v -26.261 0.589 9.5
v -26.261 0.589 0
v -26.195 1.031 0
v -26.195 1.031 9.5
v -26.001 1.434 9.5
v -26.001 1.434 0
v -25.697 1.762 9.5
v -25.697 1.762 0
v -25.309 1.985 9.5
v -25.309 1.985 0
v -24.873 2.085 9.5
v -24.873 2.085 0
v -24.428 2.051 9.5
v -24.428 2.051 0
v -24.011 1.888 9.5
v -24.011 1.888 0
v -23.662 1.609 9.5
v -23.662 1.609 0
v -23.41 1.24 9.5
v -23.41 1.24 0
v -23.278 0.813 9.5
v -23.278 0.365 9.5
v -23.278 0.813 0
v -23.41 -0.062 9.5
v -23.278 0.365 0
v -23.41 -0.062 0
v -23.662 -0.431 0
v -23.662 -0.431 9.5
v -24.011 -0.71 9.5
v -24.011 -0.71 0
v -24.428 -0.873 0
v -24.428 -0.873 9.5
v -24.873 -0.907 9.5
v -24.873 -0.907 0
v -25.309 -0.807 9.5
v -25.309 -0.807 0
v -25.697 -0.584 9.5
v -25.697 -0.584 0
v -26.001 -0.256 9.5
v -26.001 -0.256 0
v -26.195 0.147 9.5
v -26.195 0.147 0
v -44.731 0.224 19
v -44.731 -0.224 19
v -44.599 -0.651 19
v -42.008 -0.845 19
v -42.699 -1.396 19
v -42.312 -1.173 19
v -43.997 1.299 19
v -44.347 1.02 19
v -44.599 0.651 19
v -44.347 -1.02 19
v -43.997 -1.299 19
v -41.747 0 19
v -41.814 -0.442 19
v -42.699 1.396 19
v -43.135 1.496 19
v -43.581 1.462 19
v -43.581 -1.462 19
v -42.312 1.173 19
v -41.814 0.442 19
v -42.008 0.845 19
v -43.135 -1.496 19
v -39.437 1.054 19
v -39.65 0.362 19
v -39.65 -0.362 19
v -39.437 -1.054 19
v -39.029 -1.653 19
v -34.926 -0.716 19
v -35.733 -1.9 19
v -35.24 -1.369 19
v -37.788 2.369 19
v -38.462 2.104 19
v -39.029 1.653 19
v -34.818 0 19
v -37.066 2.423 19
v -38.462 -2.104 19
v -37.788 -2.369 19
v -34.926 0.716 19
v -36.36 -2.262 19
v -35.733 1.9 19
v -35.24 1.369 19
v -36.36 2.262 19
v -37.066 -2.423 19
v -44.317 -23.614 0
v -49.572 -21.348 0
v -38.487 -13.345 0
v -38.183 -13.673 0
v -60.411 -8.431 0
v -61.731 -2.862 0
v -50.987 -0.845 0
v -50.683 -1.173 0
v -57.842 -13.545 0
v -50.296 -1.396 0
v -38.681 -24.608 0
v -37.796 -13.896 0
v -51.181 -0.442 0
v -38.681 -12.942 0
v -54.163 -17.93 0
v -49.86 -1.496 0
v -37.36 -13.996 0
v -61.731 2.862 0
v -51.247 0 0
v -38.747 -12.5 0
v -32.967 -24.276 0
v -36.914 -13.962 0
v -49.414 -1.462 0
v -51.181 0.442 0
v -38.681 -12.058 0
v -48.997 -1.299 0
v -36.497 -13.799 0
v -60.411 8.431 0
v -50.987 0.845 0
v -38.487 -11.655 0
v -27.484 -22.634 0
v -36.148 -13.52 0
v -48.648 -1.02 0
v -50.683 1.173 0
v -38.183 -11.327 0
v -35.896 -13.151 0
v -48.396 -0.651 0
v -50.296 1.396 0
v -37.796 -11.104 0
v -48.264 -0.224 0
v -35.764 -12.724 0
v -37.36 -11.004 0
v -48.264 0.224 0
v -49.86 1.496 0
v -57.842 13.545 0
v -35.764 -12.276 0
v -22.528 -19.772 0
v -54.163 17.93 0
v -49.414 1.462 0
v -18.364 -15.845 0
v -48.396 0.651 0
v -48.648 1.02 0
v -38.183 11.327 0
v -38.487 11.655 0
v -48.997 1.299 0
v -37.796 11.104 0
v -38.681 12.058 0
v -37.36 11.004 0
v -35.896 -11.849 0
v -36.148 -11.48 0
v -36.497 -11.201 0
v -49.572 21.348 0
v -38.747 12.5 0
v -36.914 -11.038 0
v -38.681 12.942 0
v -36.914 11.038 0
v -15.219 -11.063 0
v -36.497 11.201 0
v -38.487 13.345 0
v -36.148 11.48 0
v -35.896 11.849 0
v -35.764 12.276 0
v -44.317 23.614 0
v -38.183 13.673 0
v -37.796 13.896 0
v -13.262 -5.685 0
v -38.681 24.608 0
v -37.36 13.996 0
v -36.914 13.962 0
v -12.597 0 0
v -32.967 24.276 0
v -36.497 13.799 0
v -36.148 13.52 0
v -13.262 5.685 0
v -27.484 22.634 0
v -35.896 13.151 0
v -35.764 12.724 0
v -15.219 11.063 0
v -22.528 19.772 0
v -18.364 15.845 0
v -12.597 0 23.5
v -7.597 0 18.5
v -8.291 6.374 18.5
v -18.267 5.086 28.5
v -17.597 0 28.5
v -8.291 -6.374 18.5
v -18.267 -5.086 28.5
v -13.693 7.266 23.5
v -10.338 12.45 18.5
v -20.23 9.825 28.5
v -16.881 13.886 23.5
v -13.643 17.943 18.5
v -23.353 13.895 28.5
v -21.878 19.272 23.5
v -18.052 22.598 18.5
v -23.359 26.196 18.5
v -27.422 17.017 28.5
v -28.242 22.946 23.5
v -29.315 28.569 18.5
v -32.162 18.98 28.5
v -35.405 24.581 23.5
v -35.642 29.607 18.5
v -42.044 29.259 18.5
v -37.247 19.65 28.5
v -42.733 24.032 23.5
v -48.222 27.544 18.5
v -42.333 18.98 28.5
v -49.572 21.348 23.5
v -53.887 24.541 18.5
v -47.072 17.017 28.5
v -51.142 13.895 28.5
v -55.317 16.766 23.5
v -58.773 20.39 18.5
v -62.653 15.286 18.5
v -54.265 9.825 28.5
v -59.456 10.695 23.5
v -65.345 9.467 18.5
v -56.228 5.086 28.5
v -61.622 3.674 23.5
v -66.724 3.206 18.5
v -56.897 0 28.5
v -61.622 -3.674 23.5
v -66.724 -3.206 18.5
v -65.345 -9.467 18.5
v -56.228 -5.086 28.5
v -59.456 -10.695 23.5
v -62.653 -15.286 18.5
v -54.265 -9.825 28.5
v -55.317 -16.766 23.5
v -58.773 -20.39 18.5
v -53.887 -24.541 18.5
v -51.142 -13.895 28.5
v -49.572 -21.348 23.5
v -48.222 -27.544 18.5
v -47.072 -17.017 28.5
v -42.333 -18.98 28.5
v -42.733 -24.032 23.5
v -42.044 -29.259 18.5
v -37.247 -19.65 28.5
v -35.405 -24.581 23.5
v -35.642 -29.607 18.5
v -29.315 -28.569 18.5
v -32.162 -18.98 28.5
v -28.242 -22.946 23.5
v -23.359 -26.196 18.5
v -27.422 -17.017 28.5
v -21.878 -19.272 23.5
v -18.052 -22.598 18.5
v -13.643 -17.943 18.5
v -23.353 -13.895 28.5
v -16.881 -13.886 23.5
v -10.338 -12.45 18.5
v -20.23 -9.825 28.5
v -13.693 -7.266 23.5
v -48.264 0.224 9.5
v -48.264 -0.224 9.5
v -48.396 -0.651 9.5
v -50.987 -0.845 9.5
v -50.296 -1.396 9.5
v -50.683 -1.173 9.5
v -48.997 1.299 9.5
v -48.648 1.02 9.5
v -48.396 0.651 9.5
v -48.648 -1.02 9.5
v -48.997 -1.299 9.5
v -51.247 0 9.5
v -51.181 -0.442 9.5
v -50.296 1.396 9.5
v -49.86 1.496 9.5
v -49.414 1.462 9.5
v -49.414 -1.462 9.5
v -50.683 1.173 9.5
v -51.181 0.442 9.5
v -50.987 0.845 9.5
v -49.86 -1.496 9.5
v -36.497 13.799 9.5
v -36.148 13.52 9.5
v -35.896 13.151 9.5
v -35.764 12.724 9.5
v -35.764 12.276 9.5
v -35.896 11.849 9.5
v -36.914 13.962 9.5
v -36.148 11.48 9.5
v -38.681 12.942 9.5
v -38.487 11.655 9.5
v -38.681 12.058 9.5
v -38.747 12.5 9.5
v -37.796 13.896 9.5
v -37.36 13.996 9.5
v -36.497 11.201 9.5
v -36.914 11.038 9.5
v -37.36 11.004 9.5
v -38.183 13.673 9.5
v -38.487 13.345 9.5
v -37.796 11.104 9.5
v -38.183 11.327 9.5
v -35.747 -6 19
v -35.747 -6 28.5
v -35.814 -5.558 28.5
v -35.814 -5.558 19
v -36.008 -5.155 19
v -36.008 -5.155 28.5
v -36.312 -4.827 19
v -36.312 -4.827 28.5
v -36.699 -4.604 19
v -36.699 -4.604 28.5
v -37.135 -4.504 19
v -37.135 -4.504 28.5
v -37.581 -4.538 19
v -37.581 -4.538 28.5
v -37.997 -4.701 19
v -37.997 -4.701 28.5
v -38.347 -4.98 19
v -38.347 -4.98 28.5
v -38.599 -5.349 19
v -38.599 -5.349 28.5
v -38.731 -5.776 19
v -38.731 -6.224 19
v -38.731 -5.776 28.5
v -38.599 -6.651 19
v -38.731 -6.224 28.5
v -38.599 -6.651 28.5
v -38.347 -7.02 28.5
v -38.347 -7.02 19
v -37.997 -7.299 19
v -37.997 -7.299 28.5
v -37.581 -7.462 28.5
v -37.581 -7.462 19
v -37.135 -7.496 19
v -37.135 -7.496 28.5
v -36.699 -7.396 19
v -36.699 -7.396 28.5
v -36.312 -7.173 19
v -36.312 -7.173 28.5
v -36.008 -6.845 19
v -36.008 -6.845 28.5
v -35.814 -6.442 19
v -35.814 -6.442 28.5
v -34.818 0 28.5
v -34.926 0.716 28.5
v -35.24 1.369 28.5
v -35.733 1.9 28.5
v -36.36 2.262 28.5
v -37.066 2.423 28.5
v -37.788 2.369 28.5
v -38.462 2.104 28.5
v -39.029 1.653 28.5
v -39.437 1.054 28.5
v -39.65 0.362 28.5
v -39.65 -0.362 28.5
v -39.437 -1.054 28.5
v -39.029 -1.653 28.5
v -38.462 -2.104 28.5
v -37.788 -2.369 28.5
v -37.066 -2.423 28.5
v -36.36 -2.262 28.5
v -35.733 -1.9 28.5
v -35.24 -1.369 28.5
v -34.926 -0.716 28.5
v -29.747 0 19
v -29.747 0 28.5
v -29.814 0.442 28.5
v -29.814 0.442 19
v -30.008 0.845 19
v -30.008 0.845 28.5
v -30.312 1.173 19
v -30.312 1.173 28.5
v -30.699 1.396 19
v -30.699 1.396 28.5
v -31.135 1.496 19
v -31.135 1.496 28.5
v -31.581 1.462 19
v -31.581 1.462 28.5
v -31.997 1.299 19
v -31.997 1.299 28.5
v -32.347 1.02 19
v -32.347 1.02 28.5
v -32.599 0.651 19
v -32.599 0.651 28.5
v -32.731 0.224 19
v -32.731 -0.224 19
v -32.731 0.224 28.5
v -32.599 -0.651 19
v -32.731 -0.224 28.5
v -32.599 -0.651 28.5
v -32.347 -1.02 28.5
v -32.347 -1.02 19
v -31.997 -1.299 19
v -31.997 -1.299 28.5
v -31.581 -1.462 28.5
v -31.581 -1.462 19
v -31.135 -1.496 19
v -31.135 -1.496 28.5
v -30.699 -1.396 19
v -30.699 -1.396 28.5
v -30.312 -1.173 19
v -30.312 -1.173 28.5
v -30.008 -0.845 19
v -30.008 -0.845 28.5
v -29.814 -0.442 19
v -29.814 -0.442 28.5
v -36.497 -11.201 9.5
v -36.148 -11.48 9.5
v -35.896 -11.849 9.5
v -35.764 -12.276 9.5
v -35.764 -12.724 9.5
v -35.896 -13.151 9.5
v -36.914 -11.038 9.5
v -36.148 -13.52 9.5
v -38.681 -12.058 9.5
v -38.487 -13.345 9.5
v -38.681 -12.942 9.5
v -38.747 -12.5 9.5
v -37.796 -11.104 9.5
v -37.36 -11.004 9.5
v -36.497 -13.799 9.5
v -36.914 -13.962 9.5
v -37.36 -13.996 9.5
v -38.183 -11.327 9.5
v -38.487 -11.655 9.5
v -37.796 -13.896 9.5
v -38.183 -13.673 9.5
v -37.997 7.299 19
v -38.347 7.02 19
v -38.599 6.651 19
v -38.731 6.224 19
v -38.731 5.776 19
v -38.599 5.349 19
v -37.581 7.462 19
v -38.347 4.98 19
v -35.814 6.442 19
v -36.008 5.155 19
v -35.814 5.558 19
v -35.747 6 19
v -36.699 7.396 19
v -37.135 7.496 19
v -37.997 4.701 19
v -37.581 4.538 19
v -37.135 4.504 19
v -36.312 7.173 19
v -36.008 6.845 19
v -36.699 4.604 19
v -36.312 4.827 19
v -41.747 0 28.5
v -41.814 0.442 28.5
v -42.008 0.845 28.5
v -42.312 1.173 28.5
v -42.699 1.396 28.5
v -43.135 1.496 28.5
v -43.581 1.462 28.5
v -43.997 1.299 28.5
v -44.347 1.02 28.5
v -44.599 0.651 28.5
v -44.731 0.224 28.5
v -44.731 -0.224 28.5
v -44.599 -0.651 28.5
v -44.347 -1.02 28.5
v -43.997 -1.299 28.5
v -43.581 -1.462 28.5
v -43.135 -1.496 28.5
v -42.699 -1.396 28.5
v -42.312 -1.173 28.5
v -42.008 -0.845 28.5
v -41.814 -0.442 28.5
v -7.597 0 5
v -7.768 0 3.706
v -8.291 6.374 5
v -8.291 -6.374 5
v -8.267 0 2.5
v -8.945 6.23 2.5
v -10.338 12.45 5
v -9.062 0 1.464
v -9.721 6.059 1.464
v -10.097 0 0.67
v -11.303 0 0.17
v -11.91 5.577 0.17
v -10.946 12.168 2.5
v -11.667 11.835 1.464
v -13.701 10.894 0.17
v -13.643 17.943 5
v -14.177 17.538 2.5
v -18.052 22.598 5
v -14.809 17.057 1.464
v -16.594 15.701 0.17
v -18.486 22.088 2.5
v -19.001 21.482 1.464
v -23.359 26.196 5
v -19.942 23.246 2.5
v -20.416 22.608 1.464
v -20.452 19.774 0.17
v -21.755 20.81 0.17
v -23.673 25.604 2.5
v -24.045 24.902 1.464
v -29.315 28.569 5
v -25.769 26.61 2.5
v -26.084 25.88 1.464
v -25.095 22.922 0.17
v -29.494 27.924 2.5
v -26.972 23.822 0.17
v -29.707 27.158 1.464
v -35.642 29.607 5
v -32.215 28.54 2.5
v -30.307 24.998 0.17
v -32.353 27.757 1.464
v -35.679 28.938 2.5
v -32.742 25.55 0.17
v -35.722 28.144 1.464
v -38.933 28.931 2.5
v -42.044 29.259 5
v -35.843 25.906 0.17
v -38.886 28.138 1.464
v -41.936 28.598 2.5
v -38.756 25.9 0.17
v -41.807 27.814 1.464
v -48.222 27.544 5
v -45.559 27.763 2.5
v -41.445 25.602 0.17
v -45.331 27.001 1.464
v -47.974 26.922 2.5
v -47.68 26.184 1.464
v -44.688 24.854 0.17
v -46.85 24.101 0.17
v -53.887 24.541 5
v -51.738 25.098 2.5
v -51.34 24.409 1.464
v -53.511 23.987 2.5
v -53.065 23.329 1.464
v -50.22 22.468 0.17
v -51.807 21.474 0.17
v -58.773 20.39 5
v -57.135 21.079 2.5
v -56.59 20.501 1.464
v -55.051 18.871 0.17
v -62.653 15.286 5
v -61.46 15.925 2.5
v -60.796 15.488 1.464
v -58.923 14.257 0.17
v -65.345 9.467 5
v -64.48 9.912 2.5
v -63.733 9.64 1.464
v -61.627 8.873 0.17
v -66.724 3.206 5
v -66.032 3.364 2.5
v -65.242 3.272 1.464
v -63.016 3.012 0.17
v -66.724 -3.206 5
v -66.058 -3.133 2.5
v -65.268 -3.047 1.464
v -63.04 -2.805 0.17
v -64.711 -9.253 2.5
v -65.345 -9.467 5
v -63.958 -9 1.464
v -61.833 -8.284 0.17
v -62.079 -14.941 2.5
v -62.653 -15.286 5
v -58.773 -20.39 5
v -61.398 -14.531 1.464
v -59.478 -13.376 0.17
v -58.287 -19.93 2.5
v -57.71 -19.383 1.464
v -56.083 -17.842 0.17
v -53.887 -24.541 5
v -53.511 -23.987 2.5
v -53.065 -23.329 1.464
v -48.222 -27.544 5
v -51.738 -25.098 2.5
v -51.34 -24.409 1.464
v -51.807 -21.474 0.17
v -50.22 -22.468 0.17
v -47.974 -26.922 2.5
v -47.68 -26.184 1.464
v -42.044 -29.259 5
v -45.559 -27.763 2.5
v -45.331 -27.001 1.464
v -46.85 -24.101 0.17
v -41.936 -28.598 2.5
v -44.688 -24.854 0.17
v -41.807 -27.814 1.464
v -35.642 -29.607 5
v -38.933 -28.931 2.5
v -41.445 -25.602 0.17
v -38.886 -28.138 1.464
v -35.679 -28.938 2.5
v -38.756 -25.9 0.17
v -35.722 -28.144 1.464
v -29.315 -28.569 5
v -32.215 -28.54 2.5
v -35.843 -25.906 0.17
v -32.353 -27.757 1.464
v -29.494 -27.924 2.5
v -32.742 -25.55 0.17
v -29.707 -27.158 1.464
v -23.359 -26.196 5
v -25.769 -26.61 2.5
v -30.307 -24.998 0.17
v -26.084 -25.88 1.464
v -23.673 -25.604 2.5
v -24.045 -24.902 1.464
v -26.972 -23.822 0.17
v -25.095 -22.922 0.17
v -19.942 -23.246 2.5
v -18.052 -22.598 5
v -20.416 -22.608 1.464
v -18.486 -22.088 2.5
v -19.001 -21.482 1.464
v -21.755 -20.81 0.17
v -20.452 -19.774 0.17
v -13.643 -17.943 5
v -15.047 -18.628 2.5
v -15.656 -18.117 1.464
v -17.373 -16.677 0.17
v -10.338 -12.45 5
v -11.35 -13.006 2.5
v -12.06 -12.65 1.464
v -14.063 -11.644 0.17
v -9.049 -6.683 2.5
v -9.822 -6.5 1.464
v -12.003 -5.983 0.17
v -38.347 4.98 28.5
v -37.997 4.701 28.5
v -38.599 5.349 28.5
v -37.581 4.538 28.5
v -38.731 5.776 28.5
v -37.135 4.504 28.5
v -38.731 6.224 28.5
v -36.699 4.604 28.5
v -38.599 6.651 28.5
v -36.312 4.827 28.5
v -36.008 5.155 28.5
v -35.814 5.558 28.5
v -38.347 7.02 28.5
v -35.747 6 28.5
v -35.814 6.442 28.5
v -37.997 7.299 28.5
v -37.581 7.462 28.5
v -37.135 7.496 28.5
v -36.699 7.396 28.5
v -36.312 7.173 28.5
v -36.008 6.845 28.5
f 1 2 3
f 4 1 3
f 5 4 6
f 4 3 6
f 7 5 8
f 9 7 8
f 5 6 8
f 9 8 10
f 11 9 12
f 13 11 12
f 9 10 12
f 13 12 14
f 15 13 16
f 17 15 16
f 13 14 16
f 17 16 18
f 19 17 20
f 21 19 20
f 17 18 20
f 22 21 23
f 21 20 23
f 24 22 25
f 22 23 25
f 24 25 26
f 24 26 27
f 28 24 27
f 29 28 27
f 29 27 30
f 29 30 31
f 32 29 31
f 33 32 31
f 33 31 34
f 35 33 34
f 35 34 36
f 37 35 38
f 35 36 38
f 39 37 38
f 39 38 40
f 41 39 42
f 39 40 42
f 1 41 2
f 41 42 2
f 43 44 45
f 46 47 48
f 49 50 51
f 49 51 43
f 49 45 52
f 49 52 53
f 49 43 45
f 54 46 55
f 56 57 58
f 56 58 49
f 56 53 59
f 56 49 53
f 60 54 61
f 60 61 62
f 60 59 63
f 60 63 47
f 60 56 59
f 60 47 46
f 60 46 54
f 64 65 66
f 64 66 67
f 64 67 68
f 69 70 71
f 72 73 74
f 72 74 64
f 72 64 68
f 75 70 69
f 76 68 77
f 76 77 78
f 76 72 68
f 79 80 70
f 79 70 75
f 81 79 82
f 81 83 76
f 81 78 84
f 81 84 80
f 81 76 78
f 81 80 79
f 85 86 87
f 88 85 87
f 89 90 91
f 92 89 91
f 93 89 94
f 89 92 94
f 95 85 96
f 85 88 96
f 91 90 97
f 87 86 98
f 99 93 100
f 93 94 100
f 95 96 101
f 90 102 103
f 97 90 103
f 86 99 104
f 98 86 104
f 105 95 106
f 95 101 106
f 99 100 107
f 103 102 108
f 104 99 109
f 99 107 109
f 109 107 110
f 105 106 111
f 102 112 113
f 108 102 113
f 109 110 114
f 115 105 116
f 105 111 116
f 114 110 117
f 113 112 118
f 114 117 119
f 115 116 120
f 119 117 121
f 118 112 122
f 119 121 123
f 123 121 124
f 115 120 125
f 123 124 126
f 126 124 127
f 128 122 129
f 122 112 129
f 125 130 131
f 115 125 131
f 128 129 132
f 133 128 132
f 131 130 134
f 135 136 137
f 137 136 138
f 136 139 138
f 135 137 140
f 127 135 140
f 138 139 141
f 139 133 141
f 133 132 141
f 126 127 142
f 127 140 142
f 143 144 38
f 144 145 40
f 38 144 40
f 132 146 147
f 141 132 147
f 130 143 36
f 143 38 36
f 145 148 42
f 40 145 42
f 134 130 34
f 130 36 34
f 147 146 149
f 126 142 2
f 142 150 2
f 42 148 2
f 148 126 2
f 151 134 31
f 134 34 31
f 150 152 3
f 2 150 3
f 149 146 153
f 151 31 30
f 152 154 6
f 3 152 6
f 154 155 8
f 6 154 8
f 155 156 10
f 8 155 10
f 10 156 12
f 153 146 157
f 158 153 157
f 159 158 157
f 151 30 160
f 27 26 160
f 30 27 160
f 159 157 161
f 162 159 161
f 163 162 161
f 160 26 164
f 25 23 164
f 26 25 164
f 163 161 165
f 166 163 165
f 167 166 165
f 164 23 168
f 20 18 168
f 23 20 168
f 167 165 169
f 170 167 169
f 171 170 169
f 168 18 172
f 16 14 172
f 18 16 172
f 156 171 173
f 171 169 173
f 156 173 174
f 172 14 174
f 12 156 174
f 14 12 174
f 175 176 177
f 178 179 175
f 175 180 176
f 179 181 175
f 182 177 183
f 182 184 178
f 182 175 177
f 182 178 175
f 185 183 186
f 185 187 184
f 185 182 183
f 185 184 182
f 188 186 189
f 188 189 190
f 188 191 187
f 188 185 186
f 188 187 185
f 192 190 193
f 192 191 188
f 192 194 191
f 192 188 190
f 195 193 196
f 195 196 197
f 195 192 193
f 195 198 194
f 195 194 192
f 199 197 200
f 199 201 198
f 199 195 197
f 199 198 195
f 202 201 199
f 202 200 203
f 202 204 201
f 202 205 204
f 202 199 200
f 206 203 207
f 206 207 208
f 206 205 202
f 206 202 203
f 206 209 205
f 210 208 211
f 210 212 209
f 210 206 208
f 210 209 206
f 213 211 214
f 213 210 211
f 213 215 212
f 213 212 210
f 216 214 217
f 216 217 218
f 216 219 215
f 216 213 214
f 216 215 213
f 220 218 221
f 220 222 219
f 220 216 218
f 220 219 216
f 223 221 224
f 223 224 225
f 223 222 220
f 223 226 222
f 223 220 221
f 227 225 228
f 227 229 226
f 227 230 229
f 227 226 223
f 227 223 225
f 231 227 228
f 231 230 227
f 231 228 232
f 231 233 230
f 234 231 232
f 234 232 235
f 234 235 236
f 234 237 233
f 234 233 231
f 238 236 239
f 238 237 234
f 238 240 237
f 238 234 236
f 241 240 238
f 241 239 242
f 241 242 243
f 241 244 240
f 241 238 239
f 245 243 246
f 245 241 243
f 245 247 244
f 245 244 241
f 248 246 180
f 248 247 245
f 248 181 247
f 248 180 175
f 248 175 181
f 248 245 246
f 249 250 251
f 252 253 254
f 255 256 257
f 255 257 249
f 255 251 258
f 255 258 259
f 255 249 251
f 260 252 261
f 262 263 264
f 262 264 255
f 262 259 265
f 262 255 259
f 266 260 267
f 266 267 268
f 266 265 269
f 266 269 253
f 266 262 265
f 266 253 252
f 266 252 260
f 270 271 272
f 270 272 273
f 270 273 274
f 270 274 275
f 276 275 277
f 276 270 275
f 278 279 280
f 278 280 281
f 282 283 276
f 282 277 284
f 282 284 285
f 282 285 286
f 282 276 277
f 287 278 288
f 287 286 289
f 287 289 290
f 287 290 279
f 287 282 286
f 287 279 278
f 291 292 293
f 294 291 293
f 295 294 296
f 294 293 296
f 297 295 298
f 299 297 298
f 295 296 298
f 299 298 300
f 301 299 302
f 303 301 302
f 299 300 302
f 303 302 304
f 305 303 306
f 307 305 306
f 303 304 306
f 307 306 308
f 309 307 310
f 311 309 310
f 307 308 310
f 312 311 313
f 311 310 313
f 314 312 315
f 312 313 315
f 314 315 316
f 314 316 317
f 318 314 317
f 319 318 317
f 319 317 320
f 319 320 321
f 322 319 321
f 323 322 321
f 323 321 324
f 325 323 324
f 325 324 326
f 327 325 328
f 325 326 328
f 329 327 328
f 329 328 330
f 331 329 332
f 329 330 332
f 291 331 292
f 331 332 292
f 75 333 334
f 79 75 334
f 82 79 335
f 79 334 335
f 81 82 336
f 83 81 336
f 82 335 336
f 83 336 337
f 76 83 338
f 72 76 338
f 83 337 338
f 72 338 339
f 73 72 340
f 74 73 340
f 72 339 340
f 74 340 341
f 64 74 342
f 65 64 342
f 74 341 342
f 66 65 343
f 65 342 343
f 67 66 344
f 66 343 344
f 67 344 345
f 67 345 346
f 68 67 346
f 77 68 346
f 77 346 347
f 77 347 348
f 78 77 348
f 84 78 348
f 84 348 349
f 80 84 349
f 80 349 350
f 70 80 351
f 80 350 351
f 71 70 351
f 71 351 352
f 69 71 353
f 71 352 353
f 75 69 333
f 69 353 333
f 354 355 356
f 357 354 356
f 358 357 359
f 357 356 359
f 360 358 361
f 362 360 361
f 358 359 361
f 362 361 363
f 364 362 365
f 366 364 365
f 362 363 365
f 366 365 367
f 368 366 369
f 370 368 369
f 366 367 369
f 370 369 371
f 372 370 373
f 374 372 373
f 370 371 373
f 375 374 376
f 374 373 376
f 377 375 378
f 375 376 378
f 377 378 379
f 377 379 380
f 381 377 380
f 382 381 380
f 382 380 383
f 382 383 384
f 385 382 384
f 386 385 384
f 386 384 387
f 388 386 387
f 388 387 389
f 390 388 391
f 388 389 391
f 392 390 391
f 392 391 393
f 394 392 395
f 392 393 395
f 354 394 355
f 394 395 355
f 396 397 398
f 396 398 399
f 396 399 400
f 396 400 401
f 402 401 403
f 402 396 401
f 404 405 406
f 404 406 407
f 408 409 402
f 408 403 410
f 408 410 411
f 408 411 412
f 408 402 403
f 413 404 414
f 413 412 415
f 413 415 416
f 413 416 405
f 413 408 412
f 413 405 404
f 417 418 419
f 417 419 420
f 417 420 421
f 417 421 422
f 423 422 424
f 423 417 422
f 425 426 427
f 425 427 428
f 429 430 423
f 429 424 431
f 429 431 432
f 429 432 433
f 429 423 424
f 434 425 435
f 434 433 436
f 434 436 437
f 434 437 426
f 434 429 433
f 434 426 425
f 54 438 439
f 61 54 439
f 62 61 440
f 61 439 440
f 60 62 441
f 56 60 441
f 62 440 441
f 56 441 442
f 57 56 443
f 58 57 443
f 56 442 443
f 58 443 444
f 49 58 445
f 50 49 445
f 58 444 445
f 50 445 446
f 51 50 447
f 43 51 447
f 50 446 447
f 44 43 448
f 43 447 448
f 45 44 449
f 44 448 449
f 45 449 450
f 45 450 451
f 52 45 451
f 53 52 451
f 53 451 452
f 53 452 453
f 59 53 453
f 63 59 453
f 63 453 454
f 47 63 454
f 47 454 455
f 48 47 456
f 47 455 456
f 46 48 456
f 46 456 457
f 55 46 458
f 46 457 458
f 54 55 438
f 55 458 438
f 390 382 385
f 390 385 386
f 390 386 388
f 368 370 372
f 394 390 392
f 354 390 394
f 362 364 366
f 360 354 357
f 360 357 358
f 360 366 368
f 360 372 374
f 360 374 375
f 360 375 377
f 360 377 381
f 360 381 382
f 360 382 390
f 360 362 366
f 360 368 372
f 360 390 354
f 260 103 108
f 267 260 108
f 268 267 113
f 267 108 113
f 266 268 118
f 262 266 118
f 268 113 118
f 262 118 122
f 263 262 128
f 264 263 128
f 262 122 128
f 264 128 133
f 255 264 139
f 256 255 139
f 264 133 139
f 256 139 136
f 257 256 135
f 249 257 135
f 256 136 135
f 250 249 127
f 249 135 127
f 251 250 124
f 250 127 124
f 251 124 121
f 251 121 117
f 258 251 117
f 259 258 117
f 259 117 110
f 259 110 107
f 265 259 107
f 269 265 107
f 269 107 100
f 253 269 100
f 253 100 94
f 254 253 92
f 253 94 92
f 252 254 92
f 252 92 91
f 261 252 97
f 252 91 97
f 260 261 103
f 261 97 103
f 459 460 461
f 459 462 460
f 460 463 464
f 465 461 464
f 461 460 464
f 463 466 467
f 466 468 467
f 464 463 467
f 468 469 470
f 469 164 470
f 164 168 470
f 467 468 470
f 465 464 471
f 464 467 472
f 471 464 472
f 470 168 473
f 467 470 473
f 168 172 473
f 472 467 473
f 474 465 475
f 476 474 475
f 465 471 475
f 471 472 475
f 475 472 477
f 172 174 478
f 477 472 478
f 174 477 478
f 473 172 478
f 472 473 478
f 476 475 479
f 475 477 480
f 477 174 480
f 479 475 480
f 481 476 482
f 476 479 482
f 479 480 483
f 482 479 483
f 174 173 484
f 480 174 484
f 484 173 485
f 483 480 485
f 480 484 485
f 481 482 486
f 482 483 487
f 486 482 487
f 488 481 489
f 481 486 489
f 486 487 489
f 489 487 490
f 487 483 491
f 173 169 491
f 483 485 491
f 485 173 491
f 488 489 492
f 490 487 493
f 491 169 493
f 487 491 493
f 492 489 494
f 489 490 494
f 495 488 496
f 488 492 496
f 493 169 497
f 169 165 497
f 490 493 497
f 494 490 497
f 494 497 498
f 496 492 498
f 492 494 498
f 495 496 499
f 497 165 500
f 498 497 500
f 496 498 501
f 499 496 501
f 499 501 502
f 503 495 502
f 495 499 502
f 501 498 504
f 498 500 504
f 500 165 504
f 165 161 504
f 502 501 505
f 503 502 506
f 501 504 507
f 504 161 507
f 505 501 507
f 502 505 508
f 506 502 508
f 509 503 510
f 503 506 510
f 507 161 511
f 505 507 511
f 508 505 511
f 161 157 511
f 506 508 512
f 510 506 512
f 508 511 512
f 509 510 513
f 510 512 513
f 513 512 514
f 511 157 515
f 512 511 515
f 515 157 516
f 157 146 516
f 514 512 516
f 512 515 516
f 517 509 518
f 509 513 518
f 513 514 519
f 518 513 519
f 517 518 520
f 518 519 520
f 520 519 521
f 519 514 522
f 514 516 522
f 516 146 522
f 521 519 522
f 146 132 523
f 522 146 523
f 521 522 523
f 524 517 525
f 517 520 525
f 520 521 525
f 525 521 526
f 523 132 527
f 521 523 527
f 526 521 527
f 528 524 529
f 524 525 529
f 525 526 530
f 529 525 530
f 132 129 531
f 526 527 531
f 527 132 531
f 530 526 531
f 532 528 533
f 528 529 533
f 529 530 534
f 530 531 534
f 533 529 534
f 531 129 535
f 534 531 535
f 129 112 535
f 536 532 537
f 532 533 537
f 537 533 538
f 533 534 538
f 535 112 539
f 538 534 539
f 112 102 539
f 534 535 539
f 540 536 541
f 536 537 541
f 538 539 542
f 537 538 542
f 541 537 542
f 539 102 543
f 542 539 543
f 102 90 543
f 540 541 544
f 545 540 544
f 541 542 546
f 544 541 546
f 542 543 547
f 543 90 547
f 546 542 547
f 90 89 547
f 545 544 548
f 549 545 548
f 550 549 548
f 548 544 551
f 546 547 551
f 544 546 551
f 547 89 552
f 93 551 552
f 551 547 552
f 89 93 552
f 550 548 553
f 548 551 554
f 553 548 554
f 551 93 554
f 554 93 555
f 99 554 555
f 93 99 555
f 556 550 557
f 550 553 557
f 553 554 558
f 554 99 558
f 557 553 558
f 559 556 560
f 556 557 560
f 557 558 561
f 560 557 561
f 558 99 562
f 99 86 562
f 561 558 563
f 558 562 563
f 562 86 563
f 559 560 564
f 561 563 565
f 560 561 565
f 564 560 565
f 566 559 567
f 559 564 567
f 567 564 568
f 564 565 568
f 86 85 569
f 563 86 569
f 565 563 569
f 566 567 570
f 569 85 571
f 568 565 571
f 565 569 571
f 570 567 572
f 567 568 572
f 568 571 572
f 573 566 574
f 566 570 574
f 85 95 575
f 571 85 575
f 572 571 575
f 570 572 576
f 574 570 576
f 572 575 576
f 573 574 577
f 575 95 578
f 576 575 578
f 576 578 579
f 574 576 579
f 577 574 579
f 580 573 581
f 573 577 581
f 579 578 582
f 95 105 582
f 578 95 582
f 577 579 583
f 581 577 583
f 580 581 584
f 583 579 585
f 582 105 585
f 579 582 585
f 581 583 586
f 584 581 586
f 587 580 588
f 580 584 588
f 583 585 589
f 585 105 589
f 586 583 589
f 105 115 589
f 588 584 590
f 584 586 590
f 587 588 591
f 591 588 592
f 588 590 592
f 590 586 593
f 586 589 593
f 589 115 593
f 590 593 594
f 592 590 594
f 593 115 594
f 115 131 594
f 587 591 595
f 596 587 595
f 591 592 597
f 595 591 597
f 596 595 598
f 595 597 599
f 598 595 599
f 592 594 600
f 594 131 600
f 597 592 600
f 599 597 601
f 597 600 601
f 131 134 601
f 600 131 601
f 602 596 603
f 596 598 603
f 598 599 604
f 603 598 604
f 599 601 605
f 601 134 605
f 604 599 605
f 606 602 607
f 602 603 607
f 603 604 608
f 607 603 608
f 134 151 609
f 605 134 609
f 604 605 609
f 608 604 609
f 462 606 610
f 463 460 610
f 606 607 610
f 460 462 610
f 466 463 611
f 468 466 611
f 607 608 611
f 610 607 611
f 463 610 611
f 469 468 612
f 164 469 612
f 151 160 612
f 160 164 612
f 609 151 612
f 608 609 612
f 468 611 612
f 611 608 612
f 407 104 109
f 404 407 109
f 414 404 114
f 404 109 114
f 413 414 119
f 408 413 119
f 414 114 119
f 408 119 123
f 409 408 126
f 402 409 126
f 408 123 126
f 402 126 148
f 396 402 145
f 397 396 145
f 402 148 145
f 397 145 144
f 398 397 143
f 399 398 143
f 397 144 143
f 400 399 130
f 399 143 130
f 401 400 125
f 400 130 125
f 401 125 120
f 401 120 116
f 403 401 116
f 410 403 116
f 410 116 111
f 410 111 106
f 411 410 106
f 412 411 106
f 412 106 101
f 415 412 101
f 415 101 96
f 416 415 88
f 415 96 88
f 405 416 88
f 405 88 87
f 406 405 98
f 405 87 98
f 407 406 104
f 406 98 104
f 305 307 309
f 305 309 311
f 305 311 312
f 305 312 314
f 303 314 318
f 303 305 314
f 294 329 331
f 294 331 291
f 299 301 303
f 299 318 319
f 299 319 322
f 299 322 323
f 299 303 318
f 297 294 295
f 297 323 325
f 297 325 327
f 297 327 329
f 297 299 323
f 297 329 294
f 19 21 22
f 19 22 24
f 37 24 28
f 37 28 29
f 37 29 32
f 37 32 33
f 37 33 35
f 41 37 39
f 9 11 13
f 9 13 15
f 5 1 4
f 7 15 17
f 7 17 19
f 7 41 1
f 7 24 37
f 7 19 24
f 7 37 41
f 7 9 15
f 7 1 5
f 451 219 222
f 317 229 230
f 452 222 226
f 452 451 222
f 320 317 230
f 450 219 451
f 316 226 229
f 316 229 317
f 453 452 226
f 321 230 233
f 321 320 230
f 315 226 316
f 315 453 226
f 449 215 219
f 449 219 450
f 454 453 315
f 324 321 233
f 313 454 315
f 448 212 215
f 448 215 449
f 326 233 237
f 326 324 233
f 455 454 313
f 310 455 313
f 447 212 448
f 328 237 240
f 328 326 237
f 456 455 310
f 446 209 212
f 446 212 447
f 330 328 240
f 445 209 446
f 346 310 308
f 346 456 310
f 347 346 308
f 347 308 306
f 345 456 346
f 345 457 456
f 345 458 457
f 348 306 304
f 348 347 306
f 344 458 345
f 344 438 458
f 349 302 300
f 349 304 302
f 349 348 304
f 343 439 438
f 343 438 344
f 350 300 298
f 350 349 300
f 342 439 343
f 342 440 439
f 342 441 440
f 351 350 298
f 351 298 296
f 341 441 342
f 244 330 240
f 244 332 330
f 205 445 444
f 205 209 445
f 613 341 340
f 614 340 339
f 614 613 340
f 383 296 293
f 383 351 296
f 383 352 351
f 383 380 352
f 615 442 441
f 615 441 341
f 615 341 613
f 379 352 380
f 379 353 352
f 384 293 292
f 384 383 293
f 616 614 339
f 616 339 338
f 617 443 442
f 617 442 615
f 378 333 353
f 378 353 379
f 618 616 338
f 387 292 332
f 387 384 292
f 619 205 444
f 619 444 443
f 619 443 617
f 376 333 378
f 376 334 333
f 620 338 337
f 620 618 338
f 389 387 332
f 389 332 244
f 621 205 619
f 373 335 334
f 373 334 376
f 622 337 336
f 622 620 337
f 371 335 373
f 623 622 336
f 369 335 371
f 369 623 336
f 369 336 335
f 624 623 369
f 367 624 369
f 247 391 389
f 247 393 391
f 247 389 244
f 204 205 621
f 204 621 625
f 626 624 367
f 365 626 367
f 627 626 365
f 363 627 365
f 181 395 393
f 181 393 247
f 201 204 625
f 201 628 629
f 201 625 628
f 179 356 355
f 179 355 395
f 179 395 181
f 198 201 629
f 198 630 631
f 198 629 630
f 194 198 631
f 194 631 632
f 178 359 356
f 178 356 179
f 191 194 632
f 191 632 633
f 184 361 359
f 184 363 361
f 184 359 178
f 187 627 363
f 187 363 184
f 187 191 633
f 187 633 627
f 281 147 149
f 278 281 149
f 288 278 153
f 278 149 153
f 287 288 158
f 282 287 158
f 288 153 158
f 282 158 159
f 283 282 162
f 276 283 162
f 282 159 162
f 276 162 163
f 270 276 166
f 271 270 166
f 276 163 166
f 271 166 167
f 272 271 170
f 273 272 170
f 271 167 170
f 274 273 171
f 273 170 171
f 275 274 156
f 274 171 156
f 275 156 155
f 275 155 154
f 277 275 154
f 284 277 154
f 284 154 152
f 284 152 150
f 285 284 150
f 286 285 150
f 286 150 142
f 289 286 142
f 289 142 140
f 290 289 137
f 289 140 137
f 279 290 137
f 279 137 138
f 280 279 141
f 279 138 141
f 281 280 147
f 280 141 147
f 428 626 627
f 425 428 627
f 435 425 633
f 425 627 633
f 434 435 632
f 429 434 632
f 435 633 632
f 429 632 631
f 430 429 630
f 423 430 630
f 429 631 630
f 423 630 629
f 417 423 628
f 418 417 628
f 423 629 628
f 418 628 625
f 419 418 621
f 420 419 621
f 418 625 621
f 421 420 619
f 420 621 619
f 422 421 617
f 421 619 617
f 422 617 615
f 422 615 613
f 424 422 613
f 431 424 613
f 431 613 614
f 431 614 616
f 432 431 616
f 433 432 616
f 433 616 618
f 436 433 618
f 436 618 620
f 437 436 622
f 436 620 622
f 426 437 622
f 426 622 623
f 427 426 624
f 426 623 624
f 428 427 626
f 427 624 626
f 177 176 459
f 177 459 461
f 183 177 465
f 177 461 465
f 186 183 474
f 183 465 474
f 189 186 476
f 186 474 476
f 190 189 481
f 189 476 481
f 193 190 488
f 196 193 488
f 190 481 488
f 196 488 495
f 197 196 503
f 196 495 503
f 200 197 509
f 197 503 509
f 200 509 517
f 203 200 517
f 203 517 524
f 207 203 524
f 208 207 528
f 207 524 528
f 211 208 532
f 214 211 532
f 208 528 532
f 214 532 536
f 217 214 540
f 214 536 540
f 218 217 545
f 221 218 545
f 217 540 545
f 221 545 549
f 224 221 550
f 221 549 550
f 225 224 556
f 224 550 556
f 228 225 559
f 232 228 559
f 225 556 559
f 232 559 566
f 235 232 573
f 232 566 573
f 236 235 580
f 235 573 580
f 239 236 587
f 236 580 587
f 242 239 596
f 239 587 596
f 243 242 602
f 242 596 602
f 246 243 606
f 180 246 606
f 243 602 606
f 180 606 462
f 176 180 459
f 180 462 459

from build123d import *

# Parameters (mm, degrees)
SKETCH1_R           = 29.65
BOSS_EXTRUDE1_DEPTH = 28.5
CHAMFER1_SIZE       = 10
FILLET1_R           = 5
SKETCH2_R           = 1.5
SKETCH2_R_2         = 2.429720262
CUT_EXTRUDE1_DEPTH  = 9.5
SKETCH3_R           = 1.5
CUT_EXTRUDE2_DEPTH  = 9.5


with BuildPart() as part:
    # Sketch1 → Boss-Extrude1 (new body)
    with BuildSketch(Plane.XY):
        with Locations((-37.247490996, 0)):
            Circle(SKETCH1_R)
    extrude(amount=BOSS_EXTRUDE1_DEPTH)

    # Chamfer1
    chamfer1_edges = [part.edges().sort_by_distance(p)[0] for p in [
        (-66.897490996, 0, 28.5),
    ]]
    chamfer(chamfer1_edges, length=CHAMFER1_SIZE)

    # Fillet1
    fillet1_edges = [part.edges().sort_by_distance(p)[0] for p in [
        (-66.897490996, 0, 0),
    ]]
    fillet(fillet1_edges, radius=FILLET1_R)

    # Sketch2 → Cut-Extrude1 (cut)
    with BuildSketch(Plane.XY.offset(28.5)):
        with Locations((-37.247490996, 6)):
            Circle(SKETCH2_R)
        with Locations((-43.247490996, 0)):
            Circle(SKETCH2_R)
        with Locations((-37.247490996, -6)):
            Circle(SKETCH2_R)
        with Locations((-31.247490996, 0)):
            Circle(SKETCH2_R)
        with Locations((-37.247490996, 0)):
            Circle(SKETCH2_R_2)
    extrude(amount=-CUT_EXTRUDE1_DEPTH, mode=Mode.SUBTRACT)

    # Sketch3 → Cut-Extrude2 (cut)
    with BuildSketch(Plane(origin=(0, 0, 0), x_dir=(-1, 0, 0), z_dir=(0, 0, -1))):
        with Locations((37.247490996, 12.5)):
            Circle(SKETCH3_R)
        with Locations((49.747490996, 0)):
            Circle(SKETCH3_R)
        with Locations((24.761374027, 0.588967782)):
            Circle(SKETCH3_R)
        with Locations((37.247490996, -12.5)):
            Circle(SKETCH3_R)
    extrude(amount=-CUT_EXTRUDE2_DEPTH, mode=Mode.SUBTRACT)


solid = part.part
